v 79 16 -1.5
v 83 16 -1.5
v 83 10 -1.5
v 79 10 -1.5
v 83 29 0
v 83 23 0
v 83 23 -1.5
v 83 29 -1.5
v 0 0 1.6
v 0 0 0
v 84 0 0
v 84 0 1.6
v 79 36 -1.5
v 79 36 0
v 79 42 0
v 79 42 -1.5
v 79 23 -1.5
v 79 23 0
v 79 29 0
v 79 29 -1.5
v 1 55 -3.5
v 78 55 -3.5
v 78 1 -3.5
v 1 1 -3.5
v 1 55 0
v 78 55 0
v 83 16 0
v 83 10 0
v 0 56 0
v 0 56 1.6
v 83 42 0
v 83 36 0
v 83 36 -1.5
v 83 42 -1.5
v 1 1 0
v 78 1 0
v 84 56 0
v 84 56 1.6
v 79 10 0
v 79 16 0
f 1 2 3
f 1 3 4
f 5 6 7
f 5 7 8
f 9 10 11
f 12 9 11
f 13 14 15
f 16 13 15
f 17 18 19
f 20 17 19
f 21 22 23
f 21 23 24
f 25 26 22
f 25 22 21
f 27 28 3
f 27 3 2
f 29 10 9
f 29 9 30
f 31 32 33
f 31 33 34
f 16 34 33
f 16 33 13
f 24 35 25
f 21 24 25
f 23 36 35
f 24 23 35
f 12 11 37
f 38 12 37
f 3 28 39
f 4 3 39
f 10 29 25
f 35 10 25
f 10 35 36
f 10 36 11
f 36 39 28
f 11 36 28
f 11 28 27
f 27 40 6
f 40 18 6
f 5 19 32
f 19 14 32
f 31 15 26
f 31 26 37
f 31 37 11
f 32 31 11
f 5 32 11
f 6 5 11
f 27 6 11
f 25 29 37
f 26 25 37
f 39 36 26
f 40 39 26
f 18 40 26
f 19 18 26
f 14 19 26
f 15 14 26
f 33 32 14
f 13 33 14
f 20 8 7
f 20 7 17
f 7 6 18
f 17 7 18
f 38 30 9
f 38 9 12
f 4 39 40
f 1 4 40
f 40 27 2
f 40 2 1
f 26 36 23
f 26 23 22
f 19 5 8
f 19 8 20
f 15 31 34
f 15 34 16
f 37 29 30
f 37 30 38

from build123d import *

# Parameters (mm, degrees)
ESQUISSE5_W         = 84
ESQUISSE5_H         = 56
BOSS_EXTRU_6_DEPTH  = 1.6
ESQUISSE6_W         = 77
ESQUISSE6_H         = 54
BOSS_EXTRU_8_DEPTH  = 3.5
ESQUISSE8_W         = 4
ESQUISSE8_H         = 6
BOSS_EXTRU_10_DEPTH = 1.5
ESQUISSE7_W         = 4
ESQUISSE7_H         = 6
BOSS_EXTRU_11_DEPTH = 1.5
ESQUISSE11_W        = 4
ESQUISSE11_H        = 6
BOSS_EXTRU_12_DEPTH = 1.5


with BuildPart() as part:
    # Esquisse5 → Boss.-Extru.6 (new body)
    with BuildSketch(Plane.XY):
        with Locations((42, 28)):
            Rectangle(ESQUISSE5_W, ESQUISSE5_H)
    extrude(amount=BOSS_EXTRU_6_DEPTH)

    # Esquisse6 → Boss.-Extru.8 (add)
    with BuildSketch(Plane(origin=(0, 0, 0), x_dir=(-1, 0, 0), z_dir=(0, 0, -1))):
        with Locations((-39.5, 28)):
            Rectangle(ESQUISSE6_W, ESQUISSE6_H)
    extrude(amount=BOSS_EXTRU_8_DEPTH)

    # Esquisse8 → Boss.-Extru.10 (add)
    with BuildSketch(Plane(origin=(0, 0, 0), x_dir=(-1, 0, 0), z_dir=(0, 0, -1))):
        with Locations((-81, 26)):
            Rectangle(ESQUISSE8_W, ESQUISSE8_H)
    extrude(amount=BOSS_EXTRU_10_DEPTH)

    # Esquisse7 → Boss.-Extru.11 (add)
    with BuildSketch(Plane(origin=(0, 0, 0), x_dir=(-1, 0, 0), z_dir=(0, 0, -1))):
        with Locations((-81, 39)):
            Rectangle(ESQUISSE7_W, ESQUISSE7_H)
    extrude(amount=BOSS_EXTRU_11_DEPTH)

    # Esquisse11 → Boss.-Extru.12 (add)
    with BuildSketch(Plane(origin=(0, 0, 0), x_dir=(-1, 0, 0), z_dir=(0, 0, -1))):
        with Locations((-81, 13)):
            Rectangle(ESQUISSE11_W, ESQUISSE11_H)
    extrude(amount=BOSS_EXTRU_12_DEPTH)


solid = part.part
